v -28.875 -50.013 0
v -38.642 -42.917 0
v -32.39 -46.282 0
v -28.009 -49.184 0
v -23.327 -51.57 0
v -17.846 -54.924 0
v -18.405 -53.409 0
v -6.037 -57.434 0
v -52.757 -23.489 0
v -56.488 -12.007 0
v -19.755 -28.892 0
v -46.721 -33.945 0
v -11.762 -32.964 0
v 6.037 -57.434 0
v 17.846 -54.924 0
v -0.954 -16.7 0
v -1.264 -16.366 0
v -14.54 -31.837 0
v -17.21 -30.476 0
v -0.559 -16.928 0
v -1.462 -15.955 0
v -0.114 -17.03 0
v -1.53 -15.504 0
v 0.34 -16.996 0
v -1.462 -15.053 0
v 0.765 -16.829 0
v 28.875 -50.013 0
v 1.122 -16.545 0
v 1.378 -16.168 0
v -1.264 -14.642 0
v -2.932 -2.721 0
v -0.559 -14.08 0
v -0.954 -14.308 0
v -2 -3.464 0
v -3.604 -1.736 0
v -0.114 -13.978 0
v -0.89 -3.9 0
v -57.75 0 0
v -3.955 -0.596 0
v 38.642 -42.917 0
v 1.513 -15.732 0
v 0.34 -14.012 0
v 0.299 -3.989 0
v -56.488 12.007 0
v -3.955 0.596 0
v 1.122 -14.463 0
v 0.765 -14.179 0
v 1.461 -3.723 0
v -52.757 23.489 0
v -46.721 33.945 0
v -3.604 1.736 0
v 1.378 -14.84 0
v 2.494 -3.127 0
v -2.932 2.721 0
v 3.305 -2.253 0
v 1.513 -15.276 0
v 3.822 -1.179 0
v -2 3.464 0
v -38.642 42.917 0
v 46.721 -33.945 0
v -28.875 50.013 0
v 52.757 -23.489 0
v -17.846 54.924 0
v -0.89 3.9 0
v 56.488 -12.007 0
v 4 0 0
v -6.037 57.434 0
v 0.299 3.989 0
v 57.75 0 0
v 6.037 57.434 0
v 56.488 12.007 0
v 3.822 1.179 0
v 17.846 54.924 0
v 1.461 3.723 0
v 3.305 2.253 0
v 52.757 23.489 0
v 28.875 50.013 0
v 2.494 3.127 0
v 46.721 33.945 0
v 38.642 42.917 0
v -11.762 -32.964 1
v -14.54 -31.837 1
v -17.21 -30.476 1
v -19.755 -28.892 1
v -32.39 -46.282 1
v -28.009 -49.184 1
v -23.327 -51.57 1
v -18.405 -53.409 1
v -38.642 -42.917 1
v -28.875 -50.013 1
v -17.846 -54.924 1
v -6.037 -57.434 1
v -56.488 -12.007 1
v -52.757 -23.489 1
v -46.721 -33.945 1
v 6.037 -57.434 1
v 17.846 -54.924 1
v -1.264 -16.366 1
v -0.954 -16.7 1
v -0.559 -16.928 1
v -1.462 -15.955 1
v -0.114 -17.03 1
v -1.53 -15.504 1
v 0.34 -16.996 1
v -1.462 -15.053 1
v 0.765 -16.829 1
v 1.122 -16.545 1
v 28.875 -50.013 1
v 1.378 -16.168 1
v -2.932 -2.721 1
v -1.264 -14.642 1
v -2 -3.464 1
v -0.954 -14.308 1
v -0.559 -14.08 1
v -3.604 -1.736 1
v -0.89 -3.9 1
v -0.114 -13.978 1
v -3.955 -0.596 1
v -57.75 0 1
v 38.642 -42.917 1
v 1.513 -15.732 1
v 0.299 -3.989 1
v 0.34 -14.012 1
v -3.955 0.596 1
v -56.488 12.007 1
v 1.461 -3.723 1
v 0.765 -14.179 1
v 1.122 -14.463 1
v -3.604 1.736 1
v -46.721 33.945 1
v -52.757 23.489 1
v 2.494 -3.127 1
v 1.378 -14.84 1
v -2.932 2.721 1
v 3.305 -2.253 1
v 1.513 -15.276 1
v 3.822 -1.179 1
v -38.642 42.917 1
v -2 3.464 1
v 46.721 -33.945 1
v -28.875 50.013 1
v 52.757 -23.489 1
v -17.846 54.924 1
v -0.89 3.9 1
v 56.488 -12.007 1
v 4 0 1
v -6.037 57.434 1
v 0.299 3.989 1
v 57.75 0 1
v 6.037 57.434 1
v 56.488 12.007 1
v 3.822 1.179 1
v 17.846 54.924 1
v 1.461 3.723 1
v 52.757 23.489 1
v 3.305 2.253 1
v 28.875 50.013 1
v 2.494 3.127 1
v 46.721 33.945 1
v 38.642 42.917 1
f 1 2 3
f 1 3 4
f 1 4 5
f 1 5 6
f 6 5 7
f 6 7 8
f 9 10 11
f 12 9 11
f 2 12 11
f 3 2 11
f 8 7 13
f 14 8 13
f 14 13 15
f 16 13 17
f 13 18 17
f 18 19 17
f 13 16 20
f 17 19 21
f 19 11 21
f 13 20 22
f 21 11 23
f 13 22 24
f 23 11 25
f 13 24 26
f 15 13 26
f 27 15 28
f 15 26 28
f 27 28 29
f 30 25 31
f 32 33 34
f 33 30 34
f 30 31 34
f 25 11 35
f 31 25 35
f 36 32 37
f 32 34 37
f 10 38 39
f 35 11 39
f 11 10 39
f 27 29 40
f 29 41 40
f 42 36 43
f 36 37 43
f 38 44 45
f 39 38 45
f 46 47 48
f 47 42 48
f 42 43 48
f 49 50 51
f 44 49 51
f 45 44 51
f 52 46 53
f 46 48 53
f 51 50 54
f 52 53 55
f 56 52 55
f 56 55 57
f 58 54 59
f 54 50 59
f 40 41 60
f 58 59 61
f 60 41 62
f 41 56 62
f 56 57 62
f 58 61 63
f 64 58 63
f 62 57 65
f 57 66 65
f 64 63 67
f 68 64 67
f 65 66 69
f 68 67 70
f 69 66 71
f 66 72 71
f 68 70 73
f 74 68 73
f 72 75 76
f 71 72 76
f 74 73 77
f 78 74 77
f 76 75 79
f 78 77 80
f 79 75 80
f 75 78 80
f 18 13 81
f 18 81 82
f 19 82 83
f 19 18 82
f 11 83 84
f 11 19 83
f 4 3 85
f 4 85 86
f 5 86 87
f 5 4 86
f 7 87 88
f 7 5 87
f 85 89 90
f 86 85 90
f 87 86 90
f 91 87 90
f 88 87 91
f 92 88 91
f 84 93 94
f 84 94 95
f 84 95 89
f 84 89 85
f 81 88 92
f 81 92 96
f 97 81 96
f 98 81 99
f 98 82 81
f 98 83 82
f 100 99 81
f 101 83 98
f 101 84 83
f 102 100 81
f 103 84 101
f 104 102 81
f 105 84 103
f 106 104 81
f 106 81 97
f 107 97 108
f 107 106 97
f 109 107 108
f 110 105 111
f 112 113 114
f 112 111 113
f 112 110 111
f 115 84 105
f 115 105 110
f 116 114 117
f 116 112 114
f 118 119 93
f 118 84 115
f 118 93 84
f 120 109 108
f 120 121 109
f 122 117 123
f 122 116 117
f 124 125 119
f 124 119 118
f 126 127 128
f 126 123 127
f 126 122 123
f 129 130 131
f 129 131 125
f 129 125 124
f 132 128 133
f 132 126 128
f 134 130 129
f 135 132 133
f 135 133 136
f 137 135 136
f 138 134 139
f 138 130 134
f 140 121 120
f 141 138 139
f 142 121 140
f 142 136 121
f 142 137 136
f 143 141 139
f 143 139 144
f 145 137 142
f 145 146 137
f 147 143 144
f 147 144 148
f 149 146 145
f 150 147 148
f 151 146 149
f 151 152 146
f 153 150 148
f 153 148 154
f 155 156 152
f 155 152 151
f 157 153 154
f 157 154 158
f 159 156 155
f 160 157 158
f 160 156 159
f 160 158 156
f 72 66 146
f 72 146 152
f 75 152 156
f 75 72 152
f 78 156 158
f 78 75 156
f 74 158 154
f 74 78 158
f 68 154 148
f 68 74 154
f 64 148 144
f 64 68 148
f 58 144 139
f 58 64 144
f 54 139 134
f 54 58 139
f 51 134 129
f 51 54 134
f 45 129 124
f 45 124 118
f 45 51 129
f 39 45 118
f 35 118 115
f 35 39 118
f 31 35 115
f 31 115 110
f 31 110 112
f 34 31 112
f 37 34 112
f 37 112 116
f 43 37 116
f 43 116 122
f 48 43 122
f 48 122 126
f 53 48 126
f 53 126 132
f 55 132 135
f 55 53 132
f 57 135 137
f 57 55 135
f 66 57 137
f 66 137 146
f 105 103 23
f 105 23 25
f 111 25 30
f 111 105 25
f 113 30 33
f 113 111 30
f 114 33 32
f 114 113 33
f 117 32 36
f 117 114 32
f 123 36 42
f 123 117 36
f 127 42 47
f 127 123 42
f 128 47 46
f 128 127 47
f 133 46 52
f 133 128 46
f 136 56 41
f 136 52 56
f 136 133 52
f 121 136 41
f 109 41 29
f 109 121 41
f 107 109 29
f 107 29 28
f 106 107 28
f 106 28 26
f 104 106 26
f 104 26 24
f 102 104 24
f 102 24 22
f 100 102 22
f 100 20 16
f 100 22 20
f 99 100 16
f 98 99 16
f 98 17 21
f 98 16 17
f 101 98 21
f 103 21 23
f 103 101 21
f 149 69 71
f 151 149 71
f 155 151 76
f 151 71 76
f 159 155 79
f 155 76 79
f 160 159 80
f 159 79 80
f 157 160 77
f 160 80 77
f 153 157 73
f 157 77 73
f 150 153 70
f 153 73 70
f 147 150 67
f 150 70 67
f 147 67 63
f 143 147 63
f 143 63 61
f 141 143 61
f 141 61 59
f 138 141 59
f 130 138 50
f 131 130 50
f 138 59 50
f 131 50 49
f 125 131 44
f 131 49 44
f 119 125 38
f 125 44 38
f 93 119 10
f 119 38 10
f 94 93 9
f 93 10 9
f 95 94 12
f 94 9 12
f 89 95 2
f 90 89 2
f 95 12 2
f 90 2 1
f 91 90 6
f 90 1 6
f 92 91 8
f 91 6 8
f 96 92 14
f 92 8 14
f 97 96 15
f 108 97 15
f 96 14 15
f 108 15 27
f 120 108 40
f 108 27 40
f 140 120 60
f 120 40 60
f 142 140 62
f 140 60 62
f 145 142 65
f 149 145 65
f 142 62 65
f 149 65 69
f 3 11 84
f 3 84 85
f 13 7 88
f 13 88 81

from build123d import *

# Parameters (mm, degrees)
ESQUISSE1_R                  = 57.75
ESQUISSE1_R_2                = 4
BOSS_EXTRU_1_DEPTH           = 1
ENL_V_MAT_EXTRU_1_DEPTH      = 82.676955134
ENL_V_MAT_EXTRU_1_DEPTH_BACK = 82.676955134
ESQUISSE2_R                  = 1.53
ENL_V_MAT_EXTRU_2_DEPTH      = 1


with BuildPart() as part:
    # Esquisse1 → Boss.-Extru.1 (new body)
    with BuildSketch(Plane.XY):
        Circle(ESQUISSE1_R)
        Circle(ESQUISSE1_R_2, mode=Mode.SUBTRACT)
    extrude(amount=BOSS_EXTRU_1_DEPTH)

    # Esquisse2 → Enlèv. mat.-Extru.1 (cut, two sides: drawn at the far end of the back side and taken through both)
    with BuildSketch(Plane(origin=(0, 0, 0), x_dir=(-1, 0, 0), z_dir=(0, 0, -1)).offset(-ENL_V_MAT_EXTRU_1_DEPTH_BACK)):
        with Locations((0, -15.504004846)):
            Circle(ESQUISSE2_R)
    extrude(amount=ENL_V_MAT_EXTRU_1_DEPTH + ENL_V_MAT_EXTRU_1_DEPTH_BACK, mode=Mode.SUBTRACT)

    # Esquisse3 → Enlèv. mat.-Extru.2 (cut)
    with BuildSketch(Plane(origin=(0, 0, 0), x_dir=(-1, 0, 0), z_dir=(0, 0, -1))):
        with BuildLine():
            Line((19.755068189, -28.89182031), (32.389647952, -46.281827468))
            ThreePointArc((32.389647952, -46.281827468), (25.70214401, -50.443439565), (18.405179994, -53.409251489))
            Line((18.405179994, -53.409251489), (11.76223589, -32.96437178))
            ThreePointArc((11.76223589, -32.96437178), (15.889667491, -31.185228347), (19.755068189, -28.89182031))
        make_face()
    extrude(amount=-ENL_V_MAT_EXTRU_2_DEPTH, mode=Mode.SUBTRACT)


solid = part.part
